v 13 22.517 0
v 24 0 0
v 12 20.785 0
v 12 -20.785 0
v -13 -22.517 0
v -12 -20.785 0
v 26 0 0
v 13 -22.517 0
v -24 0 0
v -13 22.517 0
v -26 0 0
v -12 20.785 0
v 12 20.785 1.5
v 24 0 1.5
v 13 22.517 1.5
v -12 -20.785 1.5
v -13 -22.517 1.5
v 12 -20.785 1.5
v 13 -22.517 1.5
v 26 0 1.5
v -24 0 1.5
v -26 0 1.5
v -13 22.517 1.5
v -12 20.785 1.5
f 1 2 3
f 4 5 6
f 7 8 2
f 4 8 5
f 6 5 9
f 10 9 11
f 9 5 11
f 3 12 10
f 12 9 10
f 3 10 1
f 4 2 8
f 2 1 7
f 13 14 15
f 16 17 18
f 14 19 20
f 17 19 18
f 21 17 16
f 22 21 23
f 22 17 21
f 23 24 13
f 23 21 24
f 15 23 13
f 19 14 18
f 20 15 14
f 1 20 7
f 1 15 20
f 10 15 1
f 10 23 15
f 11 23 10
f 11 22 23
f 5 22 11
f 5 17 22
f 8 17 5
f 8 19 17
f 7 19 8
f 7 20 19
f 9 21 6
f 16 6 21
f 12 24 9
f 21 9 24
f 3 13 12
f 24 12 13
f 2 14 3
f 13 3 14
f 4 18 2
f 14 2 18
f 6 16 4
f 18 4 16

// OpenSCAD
scale([1,1,1+rnd()])intersection(){
scale([1,1,0.05*rnd(2)])s();
rotate(120*2)scale([1,1+rnd(),0.05*rnd(2)])s();
rotate(120)scale([1+rnd(),1,0.05*rnd(2)])s();
    
      hull(){
         $fn=6;
        cylinder(10,25,15); 
         
     
       linear_extrude(1.25) difference() {
offset(3,$fn=12)offset(-3)        circle(25);
    }
    }

}         
$fn=6;
       linear_extrude(1.5) difference() {
        circle(26);
        circle(24);
    }

module s(){
    intersection(){
    rotate(rnd(360))surface("surf.png",true,,10);
    $fn=6;
        cylinder(200,25,20);
        }  
        
    
        }
        
        function un(v) = v / max(norm(v), 1e-64) * 1;
        function clamp(a,b=0,c=1) =  min(max(a,min(b,c)),max(b,c));
        function lerp(start,end,bias) = (end * bias + start * (1 - bias));
        function rnd(a=0,b=1)=min(a,b)+(rands(0,1,1)[0])*(max(a,b)-min(a,b));
        
